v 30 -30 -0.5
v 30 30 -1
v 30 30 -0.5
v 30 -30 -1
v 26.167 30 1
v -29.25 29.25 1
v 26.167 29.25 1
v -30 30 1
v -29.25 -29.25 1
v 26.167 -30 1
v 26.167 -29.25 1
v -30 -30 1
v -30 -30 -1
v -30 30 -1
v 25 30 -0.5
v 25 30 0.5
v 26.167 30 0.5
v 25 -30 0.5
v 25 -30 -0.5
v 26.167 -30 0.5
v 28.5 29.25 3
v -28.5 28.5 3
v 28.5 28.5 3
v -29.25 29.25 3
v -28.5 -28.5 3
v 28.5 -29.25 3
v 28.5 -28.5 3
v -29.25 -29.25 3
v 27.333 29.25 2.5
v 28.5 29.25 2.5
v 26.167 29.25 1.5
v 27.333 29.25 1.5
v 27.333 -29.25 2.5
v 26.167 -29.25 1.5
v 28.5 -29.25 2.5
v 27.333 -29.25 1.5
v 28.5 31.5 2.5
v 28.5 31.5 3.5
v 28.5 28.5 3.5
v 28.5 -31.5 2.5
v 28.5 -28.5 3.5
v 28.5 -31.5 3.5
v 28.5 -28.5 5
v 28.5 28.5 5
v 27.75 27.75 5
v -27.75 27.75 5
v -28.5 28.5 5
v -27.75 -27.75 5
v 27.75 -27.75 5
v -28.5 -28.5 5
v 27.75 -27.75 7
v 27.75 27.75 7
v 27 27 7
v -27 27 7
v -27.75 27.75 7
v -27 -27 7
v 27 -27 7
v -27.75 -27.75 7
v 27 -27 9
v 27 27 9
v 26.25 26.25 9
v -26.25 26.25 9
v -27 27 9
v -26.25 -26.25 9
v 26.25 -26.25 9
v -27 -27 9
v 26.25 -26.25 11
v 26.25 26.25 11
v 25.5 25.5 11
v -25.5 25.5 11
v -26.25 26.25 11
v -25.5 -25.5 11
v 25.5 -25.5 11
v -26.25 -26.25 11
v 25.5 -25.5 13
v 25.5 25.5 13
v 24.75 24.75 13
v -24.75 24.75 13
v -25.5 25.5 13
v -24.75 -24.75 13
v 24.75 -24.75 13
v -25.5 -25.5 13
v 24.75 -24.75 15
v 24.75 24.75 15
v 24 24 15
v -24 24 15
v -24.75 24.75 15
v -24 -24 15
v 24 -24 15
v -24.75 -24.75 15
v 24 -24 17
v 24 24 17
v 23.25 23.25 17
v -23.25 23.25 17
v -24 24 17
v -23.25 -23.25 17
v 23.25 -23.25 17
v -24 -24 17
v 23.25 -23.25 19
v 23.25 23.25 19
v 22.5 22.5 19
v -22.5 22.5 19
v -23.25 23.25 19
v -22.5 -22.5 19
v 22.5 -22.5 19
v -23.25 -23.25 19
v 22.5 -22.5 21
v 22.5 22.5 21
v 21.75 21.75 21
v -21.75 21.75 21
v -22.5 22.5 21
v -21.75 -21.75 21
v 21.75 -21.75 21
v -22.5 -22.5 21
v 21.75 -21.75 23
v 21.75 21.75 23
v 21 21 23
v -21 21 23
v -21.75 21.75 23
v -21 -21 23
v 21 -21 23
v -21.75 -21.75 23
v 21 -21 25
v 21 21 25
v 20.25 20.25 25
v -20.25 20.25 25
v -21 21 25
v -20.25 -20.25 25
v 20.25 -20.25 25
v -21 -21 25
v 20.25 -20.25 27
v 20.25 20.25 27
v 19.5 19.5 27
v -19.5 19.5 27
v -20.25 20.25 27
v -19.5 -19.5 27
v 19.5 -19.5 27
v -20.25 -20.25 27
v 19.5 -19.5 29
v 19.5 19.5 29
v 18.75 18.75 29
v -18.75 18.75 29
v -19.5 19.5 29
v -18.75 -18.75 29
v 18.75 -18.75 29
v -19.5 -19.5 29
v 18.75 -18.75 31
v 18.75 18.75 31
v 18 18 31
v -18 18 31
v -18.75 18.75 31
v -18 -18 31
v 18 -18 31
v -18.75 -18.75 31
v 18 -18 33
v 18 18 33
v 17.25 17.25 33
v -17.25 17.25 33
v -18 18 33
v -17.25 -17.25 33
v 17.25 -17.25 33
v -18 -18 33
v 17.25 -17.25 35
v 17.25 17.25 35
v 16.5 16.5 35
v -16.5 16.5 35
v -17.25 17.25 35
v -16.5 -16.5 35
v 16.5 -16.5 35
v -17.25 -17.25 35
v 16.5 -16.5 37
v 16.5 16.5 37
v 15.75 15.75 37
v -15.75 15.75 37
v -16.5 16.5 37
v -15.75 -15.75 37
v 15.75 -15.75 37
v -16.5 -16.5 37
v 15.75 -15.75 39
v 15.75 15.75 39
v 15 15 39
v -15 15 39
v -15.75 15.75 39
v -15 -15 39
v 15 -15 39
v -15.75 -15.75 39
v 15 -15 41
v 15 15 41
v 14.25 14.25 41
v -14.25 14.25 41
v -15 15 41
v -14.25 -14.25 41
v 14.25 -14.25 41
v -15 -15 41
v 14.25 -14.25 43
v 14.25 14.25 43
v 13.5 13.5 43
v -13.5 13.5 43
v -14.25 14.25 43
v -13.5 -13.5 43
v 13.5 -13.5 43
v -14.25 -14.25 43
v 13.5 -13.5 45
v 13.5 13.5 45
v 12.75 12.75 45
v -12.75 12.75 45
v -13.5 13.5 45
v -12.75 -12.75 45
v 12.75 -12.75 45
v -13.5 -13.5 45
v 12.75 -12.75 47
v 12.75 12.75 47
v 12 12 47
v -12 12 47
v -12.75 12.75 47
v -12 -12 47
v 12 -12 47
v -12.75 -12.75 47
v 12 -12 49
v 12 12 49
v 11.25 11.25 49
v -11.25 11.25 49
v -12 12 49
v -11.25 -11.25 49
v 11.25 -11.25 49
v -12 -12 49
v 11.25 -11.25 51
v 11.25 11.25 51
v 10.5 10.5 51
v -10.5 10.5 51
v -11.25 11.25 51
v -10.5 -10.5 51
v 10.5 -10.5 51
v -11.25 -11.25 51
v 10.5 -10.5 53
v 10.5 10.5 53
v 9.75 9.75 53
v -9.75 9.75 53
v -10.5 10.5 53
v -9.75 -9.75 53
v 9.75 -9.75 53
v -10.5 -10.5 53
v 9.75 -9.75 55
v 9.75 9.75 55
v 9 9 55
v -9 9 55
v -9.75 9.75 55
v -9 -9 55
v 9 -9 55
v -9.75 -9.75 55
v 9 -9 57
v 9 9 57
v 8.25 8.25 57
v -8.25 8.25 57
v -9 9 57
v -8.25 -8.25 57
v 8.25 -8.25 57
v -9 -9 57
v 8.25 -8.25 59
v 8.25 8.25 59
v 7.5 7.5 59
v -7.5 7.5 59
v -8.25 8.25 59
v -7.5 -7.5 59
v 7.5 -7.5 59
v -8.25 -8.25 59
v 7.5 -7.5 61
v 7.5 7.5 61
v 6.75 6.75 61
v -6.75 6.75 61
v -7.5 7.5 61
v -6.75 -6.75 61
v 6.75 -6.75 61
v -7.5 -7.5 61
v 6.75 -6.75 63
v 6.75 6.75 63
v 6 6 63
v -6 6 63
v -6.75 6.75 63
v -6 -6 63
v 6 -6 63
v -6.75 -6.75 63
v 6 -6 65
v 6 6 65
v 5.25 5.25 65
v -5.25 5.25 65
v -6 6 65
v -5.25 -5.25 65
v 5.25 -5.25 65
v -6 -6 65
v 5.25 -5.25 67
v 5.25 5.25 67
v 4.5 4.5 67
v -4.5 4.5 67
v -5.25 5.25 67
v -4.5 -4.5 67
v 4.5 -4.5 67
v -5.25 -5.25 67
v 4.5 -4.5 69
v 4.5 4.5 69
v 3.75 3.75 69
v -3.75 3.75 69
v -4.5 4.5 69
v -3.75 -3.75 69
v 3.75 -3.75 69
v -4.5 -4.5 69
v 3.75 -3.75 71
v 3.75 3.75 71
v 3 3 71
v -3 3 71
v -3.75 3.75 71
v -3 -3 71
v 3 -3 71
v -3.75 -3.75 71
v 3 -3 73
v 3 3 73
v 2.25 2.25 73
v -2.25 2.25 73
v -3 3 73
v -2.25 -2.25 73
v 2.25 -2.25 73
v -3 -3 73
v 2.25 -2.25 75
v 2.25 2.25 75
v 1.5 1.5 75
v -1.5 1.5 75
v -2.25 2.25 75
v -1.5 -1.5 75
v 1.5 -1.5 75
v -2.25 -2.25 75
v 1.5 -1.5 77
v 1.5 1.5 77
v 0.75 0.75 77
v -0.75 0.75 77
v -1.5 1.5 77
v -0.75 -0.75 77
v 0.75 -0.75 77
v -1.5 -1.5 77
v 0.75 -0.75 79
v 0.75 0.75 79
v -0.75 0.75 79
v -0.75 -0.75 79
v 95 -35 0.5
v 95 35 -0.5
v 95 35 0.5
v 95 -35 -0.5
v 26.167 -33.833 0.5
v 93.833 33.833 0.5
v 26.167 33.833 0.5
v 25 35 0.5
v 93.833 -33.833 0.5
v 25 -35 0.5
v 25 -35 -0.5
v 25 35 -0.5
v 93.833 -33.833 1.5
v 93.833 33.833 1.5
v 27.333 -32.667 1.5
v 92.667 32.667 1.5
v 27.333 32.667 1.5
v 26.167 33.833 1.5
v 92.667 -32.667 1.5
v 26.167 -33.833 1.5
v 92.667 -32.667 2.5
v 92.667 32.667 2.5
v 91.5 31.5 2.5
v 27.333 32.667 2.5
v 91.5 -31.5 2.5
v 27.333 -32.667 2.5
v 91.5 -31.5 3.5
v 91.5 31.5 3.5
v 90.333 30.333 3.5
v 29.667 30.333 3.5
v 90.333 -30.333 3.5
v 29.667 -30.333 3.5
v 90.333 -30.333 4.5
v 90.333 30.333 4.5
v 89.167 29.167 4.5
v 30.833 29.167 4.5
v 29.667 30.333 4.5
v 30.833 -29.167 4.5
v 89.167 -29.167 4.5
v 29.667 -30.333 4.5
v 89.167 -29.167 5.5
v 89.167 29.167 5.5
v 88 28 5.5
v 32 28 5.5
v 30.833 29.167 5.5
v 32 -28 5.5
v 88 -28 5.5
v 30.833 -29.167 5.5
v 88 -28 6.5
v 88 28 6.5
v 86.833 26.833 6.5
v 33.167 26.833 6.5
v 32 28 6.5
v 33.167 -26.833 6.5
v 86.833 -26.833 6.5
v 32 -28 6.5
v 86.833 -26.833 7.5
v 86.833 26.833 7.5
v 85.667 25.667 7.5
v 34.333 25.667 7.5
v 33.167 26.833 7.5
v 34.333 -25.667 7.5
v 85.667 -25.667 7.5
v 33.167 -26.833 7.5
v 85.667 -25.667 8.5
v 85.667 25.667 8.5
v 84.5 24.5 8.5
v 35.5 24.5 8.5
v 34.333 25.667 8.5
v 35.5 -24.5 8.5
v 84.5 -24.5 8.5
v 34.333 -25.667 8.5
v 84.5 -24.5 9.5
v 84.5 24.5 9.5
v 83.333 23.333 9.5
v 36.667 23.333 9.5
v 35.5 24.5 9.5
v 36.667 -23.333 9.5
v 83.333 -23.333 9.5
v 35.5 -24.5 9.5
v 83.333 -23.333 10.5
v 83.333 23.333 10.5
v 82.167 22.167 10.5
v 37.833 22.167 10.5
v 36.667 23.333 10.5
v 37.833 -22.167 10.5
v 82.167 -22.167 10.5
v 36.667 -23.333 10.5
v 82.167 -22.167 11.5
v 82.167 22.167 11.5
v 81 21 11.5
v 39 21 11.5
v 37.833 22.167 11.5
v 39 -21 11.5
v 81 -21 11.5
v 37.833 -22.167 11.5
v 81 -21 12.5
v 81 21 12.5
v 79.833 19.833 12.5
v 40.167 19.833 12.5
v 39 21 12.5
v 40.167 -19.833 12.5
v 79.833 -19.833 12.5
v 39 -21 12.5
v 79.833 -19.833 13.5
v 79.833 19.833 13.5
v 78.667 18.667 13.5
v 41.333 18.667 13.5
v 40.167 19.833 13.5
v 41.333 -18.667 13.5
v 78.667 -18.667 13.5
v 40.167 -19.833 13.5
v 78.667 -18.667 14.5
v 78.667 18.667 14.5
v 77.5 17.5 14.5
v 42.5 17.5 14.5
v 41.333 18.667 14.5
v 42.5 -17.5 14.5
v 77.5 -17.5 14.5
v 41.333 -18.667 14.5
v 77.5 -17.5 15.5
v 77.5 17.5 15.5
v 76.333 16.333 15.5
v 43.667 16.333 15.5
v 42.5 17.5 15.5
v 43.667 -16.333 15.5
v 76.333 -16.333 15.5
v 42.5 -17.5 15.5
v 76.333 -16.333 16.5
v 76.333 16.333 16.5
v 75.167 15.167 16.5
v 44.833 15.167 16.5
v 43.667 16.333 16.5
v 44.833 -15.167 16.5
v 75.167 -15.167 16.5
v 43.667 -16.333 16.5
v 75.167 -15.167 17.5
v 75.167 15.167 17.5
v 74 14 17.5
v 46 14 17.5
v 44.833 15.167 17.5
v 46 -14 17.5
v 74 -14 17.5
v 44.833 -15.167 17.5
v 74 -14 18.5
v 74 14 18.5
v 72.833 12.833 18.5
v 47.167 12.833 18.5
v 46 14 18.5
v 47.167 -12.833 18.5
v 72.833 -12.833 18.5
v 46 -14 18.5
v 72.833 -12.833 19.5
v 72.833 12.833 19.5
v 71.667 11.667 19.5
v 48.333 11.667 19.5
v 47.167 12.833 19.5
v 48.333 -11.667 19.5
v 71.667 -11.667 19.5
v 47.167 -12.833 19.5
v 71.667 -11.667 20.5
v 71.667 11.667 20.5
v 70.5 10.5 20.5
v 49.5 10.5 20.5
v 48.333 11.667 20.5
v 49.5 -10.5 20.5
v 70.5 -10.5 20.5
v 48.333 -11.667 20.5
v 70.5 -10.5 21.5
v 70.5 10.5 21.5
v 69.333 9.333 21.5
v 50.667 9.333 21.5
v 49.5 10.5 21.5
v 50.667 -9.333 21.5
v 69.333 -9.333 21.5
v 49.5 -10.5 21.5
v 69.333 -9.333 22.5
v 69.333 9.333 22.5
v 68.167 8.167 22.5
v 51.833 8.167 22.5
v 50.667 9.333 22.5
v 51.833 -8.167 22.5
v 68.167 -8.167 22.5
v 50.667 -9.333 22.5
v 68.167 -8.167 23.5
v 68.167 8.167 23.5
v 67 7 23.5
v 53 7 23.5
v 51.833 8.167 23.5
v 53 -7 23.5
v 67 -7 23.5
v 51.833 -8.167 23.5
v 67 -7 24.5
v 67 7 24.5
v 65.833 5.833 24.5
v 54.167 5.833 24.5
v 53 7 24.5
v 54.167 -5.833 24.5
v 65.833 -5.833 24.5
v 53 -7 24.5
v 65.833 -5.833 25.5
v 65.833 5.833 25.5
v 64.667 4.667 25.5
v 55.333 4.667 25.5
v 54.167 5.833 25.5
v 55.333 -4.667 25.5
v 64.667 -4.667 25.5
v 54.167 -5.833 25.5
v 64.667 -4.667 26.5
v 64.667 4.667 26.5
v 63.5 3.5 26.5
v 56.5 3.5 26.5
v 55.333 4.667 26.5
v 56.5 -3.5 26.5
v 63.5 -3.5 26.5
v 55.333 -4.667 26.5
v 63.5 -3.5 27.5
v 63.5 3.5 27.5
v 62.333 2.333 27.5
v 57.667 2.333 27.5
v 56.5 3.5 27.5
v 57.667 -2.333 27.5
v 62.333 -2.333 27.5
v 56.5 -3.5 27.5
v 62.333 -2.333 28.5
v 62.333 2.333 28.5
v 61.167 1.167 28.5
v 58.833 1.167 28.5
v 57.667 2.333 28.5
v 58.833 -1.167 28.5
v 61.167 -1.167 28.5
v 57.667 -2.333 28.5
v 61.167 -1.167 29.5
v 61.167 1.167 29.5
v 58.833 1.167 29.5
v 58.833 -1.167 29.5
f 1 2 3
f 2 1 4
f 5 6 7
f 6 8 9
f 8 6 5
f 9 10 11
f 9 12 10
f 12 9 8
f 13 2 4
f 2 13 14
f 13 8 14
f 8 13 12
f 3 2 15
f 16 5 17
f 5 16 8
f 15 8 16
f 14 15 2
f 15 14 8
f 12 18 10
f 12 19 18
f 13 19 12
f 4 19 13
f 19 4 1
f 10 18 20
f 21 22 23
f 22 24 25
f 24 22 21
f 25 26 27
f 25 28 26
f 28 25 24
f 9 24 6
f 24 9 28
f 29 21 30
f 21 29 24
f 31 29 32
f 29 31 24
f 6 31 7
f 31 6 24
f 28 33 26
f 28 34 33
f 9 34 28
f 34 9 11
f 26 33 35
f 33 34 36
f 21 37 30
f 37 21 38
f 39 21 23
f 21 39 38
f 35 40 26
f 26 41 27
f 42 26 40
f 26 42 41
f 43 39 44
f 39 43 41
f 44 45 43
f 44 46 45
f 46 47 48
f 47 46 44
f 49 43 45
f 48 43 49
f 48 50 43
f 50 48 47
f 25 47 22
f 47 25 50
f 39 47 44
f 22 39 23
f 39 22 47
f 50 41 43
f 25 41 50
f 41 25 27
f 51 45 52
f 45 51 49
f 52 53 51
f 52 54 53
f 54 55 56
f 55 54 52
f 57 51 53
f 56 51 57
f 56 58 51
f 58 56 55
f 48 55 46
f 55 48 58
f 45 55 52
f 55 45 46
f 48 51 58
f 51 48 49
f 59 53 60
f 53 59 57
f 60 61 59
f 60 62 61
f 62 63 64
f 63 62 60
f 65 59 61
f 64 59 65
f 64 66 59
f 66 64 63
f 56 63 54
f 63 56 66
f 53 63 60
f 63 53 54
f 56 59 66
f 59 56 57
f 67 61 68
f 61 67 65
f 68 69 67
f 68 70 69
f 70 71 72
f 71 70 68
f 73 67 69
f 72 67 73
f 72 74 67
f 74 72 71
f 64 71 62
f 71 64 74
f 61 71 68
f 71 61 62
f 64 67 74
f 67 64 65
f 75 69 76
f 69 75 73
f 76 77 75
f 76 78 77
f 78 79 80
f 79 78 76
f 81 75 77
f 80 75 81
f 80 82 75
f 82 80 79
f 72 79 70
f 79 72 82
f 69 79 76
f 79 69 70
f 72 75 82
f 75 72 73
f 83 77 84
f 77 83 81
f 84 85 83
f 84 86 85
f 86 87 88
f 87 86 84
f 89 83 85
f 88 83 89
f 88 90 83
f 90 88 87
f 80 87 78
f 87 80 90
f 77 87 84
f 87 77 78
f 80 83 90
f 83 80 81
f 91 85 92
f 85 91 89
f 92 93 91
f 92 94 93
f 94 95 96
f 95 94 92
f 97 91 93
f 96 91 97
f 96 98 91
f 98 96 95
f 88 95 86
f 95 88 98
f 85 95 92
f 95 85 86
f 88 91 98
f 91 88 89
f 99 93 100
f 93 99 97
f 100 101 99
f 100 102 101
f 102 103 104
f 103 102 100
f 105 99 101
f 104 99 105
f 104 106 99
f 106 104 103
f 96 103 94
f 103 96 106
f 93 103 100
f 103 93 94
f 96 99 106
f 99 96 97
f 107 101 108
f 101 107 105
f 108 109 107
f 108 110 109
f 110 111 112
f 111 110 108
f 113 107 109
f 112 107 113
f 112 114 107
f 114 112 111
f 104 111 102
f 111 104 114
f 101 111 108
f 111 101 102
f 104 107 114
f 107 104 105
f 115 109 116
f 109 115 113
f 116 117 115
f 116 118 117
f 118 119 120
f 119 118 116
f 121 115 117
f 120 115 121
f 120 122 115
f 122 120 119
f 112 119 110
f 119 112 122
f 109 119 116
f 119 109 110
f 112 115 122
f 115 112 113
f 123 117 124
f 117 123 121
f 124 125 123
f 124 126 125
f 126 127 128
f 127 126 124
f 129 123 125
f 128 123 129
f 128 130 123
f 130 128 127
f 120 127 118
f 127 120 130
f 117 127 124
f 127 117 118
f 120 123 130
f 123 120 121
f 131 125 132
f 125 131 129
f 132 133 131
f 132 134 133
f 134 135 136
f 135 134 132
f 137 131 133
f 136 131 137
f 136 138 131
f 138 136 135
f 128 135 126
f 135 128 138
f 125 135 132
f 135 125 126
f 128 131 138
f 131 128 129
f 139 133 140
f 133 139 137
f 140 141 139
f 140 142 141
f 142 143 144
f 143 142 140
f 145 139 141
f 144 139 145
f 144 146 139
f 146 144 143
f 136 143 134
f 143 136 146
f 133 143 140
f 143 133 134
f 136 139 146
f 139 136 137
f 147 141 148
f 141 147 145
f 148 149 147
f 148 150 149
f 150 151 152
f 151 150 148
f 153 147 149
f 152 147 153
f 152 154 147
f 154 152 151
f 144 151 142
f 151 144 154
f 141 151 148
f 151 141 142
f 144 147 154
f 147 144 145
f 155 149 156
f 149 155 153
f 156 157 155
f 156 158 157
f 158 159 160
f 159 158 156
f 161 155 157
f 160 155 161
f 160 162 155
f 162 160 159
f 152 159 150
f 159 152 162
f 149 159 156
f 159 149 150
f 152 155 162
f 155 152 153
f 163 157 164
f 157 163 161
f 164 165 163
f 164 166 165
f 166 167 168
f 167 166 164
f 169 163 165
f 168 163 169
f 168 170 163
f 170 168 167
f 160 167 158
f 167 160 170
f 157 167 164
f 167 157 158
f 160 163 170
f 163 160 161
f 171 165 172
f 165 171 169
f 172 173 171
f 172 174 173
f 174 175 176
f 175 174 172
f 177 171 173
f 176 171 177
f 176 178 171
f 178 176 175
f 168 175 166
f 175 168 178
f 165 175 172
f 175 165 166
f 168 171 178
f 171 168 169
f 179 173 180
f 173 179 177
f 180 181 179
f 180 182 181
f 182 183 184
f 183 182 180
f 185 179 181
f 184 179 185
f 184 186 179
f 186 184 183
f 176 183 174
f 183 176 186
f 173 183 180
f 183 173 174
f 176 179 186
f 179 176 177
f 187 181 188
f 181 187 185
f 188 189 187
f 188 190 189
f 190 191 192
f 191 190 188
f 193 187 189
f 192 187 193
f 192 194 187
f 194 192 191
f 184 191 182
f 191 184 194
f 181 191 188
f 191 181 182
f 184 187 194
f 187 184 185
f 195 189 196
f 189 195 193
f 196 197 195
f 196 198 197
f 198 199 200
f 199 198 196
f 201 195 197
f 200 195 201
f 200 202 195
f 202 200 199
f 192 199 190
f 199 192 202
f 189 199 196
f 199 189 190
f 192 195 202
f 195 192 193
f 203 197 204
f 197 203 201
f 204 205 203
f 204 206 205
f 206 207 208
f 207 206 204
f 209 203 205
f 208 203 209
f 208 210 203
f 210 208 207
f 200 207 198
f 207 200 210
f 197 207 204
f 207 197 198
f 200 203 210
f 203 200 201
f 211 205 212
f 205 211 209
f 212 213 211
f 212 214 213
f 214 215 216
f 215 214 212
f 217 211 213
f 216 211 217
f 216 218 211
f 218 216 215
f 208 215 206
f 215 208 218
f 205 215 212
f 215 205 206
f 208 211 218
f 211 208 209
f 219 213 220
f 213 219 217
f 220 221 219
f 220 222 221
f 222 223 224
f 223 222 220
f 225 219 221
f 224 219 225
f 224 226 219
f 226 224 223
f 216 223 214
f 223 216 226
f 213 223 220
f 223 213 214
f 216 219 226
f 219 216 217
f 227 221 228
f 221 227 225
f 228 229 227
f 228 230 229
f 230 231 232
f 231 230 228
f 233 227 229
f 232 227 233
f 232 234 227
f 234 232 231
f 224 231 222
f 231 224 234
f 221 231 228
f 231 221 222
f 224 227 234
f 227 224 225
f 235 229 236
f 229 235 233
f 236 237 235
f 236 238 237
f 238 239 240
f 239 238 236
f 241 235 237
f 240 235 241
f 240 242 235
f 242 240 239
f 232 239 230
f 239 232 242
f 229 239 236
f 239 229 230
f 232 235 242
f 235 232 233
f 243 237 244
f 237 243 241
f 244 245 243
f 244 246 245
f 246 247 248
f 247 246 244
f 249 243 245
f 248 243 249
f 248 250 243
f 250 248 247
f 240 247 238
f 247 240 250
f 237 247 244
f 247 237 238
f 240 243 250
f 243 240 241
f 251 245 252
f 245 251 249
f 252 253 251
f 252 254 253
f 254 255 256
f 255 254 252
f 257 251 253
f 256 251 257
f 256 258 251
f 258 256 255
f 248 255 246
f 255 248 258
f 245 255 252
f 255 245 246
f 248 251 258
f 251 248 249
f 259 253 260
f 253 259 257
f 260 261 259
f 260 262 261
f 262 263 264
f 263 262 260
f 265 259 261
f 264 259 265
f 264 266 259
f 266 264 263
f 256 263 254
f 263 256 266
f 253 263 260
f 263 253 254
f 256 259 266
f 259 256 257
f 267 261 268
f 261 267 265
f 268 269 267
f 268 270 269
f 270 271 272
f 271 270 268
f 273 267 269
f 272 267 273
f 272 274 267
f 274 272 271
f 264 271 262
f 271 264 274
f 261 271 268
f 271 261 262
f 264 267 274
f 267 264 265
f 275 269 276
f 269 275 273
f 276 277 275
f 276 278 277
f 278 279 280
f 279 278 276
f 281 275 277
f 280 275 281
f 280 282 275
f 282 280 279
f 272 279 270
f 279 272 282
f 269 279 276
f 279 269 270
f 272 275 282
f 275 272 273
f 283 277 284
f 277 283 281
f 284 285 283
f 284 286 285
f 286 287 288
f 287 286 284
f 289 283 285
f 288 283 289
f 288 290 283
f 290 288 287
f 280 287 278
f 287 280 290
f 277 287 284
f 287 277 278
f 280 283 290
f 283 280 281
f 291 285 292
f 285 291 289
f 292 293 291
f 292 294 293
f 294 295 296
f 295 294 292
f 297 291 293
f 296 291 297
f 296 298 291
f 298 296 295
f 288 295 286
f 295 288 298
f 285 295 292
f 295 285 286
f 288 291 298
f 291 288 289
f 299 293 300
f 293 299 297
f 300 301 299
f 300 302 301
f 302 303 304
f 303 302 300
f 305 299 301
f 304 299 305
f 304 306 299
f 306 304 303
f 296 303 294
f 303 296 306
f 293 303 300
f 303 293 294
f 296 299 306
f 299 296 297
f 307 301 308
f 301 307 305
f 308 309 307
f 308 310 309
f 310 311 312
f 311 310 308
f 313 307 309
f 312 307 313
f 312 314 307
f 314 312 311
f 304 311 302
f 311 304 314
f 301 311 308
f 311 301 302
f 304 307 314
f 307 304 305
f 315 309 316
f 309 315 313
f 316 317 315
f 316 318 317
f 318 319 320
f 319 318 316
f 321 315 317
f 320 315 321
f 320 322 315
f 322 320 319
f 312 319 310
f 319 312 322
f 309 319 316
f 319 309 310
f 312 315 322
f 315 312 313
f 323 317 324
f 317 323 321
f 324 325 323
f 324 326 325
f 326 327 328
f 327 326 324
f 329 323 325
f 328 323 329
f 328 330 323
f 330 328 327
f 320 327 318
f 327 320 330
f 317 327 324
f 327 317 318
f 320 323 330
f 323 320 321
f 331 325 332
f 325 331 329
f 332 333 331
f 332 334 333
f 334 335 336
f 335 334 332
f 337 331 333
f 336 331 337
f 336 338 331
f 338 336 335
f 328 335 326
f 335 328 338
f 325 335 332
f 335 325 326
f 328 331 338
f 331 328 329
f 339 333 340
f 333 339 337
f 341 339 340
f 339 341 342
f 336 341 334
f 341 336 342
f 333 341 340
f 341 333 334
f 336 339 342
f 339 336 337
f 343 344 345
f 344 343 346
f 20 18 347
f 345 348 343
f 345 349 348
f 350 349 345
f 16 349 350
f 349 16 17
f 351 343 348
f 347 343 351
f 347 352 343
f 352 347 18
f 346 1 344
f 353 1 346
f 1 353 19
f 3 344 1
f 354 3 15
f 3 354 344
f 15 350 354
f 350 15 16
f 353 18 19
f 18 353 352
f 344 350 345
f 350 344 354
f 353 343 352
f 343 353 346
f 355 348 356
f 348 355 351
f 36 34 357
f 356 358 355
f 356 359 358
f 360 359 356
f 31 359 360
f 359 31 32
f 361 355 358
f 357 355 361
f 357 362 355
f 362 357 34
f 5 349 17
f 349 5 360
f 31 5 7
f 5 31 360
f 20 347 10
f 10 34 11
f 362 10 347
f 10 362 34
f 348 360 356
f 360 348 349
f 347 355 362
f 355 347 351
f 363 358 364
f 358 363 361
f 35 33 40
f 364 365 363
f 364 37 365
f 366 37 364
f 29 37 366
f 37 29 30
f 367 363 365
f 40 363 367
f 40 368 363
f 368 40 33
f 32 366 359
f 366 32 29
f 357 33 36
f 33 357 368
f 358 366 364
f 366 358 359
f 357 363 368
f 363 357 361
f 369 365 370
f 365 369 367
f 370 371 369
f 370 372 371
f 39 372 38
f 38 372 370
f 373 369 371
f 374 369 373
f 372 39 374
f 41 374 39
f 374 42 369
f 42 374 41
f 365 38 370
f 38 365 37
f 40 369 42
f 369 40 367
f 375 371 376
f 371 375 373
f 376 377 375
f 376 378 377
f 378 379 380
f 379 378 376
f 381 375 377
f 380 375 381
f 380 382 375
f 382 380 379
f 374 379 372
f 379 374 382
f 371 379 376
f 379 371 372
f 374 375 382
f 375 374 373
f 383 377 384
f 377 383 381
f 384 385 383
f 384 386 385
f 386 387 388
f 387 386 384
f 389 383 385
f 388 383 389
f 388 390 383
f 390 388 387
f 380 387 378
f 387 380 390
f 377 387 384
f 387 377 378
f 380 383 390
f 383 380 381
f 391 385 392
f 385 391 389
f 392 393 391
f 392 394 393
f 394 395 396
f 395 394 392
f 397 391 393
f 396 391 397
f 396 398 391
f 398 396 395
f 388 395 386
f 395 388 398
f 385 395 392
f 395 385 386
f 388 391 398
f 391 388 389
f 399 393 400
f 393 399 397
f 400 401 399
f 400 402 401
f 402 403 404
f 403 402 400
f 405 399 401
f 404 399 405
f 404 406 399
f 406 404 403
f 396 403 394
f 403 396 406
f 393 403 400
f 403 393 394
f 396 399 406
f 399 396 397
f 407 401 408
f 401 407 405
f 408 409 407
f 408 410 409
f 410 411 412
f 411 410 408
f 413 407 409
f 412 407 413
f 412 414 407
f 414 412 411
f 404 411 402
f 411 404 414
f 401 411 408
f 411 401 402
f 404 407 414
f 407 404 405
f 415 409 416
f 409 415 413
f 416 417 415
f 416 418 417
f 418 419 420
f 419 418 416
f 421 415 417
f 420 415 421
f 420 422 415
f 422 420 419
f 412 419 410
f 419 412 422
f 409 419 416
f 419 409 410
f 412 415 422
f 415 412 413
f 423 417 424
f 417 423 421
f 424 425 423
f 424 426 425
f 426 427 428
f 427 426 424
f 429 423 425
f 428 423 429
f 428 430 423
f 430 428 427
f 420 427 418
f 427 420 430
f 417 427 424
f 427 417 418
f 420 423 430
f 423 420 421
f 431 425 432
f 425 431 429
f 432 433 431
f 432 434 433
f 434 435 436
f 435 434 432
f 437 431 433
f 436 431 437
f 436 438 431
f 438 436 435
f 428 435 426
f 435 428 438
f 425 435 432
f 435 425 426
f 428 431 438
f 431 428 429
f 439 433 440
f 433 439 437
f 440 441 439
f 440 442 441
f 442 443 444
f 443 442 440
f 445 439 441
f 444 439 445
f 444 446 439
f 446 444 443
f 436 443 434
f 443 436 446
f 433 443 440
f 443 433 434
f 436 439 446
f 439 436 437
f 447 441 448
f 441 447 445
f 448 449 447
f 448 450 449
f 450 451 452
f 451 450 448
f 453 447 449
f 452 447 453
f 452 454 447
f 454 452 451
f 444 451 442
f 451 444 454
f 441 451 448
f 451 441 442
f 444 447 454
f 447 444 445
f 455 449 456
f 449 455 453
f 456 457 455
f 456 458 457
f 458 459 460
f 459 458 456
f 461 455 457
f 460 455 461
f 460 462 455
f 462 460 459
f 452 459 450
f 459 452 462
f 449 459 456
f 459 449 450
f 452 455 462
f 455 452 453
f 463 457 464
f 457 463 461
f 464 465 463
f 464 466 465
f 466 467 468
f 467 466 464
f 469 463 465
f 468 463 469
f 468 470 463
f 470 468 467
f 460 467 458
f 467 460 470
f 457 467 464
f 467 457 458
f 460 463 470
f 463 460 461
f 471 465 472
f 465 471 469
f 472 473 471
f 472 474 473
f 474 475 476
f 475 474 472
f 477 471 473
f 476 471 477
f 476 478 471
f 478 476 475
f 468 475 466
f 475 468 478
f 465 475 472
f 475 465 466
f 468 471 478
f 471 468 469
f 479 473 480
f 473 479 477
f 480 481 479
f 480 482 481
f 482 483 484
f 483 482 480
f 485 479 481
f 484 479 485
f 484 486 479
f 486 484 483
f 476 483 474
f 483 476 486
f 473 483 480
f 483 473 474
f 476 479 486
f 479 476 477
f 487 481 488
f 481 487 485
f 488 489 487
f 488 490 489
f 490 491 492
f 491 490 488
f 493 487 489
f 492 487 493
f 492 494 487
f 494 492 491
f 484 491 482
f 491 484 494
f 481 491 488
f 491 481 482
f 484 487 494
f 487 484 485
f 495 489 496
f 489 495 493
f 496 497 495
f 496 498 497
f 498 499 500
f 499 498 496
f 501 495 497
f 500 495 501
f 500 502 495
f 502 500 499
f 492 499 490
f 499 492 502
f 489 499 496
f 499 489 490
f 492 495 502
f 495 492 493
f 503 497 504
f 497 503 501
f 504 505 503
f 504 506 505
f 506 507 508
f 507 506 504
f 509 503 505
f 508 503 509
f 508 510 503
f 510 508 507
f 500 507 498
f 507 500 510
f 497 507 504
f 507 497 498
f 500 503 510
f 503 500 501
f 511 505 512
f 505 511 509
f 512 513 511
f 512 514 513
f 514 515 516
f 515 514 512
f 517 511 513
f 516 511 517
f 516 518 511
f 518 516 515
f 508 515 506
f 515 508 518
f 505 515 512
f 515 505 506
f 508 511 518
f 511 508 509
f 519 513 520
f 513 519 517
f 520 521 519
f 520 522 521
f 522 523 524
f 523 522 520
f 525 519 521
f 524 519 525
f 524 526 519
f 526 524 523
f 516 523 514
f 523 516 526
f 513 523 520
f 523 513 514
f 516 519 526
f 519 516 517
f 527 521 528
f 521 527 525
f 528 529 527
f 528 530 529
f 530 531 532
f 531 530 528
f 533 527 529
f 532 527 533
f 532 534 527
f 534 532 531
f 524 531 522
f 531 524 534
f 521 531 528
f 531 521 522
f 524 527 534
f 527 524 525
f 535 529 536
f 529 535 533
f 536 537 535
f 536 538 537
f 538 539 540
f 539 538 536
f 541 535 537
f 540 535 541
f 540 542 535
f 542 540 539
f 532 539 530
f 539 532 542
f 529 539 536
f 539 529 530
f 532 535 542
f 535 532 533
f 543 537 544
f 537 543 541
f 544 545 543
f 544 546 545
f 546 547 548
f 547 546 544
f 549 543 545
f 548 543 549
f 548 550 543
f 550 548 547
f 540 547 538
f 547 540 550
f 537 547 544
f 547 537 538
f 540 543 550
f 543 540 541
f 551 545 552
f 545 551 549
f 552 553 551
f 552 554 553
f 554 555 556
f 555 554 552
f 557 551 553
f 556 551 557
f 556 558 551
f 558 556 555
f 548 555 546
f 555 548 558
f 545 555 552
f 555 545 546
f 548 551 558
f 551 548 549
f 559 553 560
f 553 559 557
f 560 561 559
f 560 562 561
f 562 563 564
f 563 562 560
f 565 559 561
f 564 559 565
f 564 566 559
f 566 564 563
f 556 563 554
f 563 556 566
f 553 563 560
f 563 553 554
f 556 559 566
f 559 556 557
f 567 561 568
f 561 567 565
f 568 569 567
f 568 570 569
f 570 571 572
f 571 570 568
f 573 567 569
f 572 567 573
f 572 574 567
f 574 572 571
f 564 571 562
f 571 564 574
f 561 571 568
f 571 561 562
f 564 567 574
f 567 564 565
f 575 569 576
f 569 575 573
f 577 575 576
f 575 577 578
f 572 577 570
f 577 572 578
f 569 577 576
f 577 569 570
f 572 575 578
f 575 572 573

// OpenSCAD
pyramid(2,40,60);
translate([60,0,0])
  pyramid(1,30,70);


module pyramid(stepheight, stairs, stairwidth) {
stairReduction = stairwidth / stairs;
union() {
  for(i=[0:stairs]) {
      translate([0,0,i*stepheight])
        cube([stairwidth - i*stairReduction, stairwidth - i*stairReduction, stepheight], center=true);
  }    
}
};
